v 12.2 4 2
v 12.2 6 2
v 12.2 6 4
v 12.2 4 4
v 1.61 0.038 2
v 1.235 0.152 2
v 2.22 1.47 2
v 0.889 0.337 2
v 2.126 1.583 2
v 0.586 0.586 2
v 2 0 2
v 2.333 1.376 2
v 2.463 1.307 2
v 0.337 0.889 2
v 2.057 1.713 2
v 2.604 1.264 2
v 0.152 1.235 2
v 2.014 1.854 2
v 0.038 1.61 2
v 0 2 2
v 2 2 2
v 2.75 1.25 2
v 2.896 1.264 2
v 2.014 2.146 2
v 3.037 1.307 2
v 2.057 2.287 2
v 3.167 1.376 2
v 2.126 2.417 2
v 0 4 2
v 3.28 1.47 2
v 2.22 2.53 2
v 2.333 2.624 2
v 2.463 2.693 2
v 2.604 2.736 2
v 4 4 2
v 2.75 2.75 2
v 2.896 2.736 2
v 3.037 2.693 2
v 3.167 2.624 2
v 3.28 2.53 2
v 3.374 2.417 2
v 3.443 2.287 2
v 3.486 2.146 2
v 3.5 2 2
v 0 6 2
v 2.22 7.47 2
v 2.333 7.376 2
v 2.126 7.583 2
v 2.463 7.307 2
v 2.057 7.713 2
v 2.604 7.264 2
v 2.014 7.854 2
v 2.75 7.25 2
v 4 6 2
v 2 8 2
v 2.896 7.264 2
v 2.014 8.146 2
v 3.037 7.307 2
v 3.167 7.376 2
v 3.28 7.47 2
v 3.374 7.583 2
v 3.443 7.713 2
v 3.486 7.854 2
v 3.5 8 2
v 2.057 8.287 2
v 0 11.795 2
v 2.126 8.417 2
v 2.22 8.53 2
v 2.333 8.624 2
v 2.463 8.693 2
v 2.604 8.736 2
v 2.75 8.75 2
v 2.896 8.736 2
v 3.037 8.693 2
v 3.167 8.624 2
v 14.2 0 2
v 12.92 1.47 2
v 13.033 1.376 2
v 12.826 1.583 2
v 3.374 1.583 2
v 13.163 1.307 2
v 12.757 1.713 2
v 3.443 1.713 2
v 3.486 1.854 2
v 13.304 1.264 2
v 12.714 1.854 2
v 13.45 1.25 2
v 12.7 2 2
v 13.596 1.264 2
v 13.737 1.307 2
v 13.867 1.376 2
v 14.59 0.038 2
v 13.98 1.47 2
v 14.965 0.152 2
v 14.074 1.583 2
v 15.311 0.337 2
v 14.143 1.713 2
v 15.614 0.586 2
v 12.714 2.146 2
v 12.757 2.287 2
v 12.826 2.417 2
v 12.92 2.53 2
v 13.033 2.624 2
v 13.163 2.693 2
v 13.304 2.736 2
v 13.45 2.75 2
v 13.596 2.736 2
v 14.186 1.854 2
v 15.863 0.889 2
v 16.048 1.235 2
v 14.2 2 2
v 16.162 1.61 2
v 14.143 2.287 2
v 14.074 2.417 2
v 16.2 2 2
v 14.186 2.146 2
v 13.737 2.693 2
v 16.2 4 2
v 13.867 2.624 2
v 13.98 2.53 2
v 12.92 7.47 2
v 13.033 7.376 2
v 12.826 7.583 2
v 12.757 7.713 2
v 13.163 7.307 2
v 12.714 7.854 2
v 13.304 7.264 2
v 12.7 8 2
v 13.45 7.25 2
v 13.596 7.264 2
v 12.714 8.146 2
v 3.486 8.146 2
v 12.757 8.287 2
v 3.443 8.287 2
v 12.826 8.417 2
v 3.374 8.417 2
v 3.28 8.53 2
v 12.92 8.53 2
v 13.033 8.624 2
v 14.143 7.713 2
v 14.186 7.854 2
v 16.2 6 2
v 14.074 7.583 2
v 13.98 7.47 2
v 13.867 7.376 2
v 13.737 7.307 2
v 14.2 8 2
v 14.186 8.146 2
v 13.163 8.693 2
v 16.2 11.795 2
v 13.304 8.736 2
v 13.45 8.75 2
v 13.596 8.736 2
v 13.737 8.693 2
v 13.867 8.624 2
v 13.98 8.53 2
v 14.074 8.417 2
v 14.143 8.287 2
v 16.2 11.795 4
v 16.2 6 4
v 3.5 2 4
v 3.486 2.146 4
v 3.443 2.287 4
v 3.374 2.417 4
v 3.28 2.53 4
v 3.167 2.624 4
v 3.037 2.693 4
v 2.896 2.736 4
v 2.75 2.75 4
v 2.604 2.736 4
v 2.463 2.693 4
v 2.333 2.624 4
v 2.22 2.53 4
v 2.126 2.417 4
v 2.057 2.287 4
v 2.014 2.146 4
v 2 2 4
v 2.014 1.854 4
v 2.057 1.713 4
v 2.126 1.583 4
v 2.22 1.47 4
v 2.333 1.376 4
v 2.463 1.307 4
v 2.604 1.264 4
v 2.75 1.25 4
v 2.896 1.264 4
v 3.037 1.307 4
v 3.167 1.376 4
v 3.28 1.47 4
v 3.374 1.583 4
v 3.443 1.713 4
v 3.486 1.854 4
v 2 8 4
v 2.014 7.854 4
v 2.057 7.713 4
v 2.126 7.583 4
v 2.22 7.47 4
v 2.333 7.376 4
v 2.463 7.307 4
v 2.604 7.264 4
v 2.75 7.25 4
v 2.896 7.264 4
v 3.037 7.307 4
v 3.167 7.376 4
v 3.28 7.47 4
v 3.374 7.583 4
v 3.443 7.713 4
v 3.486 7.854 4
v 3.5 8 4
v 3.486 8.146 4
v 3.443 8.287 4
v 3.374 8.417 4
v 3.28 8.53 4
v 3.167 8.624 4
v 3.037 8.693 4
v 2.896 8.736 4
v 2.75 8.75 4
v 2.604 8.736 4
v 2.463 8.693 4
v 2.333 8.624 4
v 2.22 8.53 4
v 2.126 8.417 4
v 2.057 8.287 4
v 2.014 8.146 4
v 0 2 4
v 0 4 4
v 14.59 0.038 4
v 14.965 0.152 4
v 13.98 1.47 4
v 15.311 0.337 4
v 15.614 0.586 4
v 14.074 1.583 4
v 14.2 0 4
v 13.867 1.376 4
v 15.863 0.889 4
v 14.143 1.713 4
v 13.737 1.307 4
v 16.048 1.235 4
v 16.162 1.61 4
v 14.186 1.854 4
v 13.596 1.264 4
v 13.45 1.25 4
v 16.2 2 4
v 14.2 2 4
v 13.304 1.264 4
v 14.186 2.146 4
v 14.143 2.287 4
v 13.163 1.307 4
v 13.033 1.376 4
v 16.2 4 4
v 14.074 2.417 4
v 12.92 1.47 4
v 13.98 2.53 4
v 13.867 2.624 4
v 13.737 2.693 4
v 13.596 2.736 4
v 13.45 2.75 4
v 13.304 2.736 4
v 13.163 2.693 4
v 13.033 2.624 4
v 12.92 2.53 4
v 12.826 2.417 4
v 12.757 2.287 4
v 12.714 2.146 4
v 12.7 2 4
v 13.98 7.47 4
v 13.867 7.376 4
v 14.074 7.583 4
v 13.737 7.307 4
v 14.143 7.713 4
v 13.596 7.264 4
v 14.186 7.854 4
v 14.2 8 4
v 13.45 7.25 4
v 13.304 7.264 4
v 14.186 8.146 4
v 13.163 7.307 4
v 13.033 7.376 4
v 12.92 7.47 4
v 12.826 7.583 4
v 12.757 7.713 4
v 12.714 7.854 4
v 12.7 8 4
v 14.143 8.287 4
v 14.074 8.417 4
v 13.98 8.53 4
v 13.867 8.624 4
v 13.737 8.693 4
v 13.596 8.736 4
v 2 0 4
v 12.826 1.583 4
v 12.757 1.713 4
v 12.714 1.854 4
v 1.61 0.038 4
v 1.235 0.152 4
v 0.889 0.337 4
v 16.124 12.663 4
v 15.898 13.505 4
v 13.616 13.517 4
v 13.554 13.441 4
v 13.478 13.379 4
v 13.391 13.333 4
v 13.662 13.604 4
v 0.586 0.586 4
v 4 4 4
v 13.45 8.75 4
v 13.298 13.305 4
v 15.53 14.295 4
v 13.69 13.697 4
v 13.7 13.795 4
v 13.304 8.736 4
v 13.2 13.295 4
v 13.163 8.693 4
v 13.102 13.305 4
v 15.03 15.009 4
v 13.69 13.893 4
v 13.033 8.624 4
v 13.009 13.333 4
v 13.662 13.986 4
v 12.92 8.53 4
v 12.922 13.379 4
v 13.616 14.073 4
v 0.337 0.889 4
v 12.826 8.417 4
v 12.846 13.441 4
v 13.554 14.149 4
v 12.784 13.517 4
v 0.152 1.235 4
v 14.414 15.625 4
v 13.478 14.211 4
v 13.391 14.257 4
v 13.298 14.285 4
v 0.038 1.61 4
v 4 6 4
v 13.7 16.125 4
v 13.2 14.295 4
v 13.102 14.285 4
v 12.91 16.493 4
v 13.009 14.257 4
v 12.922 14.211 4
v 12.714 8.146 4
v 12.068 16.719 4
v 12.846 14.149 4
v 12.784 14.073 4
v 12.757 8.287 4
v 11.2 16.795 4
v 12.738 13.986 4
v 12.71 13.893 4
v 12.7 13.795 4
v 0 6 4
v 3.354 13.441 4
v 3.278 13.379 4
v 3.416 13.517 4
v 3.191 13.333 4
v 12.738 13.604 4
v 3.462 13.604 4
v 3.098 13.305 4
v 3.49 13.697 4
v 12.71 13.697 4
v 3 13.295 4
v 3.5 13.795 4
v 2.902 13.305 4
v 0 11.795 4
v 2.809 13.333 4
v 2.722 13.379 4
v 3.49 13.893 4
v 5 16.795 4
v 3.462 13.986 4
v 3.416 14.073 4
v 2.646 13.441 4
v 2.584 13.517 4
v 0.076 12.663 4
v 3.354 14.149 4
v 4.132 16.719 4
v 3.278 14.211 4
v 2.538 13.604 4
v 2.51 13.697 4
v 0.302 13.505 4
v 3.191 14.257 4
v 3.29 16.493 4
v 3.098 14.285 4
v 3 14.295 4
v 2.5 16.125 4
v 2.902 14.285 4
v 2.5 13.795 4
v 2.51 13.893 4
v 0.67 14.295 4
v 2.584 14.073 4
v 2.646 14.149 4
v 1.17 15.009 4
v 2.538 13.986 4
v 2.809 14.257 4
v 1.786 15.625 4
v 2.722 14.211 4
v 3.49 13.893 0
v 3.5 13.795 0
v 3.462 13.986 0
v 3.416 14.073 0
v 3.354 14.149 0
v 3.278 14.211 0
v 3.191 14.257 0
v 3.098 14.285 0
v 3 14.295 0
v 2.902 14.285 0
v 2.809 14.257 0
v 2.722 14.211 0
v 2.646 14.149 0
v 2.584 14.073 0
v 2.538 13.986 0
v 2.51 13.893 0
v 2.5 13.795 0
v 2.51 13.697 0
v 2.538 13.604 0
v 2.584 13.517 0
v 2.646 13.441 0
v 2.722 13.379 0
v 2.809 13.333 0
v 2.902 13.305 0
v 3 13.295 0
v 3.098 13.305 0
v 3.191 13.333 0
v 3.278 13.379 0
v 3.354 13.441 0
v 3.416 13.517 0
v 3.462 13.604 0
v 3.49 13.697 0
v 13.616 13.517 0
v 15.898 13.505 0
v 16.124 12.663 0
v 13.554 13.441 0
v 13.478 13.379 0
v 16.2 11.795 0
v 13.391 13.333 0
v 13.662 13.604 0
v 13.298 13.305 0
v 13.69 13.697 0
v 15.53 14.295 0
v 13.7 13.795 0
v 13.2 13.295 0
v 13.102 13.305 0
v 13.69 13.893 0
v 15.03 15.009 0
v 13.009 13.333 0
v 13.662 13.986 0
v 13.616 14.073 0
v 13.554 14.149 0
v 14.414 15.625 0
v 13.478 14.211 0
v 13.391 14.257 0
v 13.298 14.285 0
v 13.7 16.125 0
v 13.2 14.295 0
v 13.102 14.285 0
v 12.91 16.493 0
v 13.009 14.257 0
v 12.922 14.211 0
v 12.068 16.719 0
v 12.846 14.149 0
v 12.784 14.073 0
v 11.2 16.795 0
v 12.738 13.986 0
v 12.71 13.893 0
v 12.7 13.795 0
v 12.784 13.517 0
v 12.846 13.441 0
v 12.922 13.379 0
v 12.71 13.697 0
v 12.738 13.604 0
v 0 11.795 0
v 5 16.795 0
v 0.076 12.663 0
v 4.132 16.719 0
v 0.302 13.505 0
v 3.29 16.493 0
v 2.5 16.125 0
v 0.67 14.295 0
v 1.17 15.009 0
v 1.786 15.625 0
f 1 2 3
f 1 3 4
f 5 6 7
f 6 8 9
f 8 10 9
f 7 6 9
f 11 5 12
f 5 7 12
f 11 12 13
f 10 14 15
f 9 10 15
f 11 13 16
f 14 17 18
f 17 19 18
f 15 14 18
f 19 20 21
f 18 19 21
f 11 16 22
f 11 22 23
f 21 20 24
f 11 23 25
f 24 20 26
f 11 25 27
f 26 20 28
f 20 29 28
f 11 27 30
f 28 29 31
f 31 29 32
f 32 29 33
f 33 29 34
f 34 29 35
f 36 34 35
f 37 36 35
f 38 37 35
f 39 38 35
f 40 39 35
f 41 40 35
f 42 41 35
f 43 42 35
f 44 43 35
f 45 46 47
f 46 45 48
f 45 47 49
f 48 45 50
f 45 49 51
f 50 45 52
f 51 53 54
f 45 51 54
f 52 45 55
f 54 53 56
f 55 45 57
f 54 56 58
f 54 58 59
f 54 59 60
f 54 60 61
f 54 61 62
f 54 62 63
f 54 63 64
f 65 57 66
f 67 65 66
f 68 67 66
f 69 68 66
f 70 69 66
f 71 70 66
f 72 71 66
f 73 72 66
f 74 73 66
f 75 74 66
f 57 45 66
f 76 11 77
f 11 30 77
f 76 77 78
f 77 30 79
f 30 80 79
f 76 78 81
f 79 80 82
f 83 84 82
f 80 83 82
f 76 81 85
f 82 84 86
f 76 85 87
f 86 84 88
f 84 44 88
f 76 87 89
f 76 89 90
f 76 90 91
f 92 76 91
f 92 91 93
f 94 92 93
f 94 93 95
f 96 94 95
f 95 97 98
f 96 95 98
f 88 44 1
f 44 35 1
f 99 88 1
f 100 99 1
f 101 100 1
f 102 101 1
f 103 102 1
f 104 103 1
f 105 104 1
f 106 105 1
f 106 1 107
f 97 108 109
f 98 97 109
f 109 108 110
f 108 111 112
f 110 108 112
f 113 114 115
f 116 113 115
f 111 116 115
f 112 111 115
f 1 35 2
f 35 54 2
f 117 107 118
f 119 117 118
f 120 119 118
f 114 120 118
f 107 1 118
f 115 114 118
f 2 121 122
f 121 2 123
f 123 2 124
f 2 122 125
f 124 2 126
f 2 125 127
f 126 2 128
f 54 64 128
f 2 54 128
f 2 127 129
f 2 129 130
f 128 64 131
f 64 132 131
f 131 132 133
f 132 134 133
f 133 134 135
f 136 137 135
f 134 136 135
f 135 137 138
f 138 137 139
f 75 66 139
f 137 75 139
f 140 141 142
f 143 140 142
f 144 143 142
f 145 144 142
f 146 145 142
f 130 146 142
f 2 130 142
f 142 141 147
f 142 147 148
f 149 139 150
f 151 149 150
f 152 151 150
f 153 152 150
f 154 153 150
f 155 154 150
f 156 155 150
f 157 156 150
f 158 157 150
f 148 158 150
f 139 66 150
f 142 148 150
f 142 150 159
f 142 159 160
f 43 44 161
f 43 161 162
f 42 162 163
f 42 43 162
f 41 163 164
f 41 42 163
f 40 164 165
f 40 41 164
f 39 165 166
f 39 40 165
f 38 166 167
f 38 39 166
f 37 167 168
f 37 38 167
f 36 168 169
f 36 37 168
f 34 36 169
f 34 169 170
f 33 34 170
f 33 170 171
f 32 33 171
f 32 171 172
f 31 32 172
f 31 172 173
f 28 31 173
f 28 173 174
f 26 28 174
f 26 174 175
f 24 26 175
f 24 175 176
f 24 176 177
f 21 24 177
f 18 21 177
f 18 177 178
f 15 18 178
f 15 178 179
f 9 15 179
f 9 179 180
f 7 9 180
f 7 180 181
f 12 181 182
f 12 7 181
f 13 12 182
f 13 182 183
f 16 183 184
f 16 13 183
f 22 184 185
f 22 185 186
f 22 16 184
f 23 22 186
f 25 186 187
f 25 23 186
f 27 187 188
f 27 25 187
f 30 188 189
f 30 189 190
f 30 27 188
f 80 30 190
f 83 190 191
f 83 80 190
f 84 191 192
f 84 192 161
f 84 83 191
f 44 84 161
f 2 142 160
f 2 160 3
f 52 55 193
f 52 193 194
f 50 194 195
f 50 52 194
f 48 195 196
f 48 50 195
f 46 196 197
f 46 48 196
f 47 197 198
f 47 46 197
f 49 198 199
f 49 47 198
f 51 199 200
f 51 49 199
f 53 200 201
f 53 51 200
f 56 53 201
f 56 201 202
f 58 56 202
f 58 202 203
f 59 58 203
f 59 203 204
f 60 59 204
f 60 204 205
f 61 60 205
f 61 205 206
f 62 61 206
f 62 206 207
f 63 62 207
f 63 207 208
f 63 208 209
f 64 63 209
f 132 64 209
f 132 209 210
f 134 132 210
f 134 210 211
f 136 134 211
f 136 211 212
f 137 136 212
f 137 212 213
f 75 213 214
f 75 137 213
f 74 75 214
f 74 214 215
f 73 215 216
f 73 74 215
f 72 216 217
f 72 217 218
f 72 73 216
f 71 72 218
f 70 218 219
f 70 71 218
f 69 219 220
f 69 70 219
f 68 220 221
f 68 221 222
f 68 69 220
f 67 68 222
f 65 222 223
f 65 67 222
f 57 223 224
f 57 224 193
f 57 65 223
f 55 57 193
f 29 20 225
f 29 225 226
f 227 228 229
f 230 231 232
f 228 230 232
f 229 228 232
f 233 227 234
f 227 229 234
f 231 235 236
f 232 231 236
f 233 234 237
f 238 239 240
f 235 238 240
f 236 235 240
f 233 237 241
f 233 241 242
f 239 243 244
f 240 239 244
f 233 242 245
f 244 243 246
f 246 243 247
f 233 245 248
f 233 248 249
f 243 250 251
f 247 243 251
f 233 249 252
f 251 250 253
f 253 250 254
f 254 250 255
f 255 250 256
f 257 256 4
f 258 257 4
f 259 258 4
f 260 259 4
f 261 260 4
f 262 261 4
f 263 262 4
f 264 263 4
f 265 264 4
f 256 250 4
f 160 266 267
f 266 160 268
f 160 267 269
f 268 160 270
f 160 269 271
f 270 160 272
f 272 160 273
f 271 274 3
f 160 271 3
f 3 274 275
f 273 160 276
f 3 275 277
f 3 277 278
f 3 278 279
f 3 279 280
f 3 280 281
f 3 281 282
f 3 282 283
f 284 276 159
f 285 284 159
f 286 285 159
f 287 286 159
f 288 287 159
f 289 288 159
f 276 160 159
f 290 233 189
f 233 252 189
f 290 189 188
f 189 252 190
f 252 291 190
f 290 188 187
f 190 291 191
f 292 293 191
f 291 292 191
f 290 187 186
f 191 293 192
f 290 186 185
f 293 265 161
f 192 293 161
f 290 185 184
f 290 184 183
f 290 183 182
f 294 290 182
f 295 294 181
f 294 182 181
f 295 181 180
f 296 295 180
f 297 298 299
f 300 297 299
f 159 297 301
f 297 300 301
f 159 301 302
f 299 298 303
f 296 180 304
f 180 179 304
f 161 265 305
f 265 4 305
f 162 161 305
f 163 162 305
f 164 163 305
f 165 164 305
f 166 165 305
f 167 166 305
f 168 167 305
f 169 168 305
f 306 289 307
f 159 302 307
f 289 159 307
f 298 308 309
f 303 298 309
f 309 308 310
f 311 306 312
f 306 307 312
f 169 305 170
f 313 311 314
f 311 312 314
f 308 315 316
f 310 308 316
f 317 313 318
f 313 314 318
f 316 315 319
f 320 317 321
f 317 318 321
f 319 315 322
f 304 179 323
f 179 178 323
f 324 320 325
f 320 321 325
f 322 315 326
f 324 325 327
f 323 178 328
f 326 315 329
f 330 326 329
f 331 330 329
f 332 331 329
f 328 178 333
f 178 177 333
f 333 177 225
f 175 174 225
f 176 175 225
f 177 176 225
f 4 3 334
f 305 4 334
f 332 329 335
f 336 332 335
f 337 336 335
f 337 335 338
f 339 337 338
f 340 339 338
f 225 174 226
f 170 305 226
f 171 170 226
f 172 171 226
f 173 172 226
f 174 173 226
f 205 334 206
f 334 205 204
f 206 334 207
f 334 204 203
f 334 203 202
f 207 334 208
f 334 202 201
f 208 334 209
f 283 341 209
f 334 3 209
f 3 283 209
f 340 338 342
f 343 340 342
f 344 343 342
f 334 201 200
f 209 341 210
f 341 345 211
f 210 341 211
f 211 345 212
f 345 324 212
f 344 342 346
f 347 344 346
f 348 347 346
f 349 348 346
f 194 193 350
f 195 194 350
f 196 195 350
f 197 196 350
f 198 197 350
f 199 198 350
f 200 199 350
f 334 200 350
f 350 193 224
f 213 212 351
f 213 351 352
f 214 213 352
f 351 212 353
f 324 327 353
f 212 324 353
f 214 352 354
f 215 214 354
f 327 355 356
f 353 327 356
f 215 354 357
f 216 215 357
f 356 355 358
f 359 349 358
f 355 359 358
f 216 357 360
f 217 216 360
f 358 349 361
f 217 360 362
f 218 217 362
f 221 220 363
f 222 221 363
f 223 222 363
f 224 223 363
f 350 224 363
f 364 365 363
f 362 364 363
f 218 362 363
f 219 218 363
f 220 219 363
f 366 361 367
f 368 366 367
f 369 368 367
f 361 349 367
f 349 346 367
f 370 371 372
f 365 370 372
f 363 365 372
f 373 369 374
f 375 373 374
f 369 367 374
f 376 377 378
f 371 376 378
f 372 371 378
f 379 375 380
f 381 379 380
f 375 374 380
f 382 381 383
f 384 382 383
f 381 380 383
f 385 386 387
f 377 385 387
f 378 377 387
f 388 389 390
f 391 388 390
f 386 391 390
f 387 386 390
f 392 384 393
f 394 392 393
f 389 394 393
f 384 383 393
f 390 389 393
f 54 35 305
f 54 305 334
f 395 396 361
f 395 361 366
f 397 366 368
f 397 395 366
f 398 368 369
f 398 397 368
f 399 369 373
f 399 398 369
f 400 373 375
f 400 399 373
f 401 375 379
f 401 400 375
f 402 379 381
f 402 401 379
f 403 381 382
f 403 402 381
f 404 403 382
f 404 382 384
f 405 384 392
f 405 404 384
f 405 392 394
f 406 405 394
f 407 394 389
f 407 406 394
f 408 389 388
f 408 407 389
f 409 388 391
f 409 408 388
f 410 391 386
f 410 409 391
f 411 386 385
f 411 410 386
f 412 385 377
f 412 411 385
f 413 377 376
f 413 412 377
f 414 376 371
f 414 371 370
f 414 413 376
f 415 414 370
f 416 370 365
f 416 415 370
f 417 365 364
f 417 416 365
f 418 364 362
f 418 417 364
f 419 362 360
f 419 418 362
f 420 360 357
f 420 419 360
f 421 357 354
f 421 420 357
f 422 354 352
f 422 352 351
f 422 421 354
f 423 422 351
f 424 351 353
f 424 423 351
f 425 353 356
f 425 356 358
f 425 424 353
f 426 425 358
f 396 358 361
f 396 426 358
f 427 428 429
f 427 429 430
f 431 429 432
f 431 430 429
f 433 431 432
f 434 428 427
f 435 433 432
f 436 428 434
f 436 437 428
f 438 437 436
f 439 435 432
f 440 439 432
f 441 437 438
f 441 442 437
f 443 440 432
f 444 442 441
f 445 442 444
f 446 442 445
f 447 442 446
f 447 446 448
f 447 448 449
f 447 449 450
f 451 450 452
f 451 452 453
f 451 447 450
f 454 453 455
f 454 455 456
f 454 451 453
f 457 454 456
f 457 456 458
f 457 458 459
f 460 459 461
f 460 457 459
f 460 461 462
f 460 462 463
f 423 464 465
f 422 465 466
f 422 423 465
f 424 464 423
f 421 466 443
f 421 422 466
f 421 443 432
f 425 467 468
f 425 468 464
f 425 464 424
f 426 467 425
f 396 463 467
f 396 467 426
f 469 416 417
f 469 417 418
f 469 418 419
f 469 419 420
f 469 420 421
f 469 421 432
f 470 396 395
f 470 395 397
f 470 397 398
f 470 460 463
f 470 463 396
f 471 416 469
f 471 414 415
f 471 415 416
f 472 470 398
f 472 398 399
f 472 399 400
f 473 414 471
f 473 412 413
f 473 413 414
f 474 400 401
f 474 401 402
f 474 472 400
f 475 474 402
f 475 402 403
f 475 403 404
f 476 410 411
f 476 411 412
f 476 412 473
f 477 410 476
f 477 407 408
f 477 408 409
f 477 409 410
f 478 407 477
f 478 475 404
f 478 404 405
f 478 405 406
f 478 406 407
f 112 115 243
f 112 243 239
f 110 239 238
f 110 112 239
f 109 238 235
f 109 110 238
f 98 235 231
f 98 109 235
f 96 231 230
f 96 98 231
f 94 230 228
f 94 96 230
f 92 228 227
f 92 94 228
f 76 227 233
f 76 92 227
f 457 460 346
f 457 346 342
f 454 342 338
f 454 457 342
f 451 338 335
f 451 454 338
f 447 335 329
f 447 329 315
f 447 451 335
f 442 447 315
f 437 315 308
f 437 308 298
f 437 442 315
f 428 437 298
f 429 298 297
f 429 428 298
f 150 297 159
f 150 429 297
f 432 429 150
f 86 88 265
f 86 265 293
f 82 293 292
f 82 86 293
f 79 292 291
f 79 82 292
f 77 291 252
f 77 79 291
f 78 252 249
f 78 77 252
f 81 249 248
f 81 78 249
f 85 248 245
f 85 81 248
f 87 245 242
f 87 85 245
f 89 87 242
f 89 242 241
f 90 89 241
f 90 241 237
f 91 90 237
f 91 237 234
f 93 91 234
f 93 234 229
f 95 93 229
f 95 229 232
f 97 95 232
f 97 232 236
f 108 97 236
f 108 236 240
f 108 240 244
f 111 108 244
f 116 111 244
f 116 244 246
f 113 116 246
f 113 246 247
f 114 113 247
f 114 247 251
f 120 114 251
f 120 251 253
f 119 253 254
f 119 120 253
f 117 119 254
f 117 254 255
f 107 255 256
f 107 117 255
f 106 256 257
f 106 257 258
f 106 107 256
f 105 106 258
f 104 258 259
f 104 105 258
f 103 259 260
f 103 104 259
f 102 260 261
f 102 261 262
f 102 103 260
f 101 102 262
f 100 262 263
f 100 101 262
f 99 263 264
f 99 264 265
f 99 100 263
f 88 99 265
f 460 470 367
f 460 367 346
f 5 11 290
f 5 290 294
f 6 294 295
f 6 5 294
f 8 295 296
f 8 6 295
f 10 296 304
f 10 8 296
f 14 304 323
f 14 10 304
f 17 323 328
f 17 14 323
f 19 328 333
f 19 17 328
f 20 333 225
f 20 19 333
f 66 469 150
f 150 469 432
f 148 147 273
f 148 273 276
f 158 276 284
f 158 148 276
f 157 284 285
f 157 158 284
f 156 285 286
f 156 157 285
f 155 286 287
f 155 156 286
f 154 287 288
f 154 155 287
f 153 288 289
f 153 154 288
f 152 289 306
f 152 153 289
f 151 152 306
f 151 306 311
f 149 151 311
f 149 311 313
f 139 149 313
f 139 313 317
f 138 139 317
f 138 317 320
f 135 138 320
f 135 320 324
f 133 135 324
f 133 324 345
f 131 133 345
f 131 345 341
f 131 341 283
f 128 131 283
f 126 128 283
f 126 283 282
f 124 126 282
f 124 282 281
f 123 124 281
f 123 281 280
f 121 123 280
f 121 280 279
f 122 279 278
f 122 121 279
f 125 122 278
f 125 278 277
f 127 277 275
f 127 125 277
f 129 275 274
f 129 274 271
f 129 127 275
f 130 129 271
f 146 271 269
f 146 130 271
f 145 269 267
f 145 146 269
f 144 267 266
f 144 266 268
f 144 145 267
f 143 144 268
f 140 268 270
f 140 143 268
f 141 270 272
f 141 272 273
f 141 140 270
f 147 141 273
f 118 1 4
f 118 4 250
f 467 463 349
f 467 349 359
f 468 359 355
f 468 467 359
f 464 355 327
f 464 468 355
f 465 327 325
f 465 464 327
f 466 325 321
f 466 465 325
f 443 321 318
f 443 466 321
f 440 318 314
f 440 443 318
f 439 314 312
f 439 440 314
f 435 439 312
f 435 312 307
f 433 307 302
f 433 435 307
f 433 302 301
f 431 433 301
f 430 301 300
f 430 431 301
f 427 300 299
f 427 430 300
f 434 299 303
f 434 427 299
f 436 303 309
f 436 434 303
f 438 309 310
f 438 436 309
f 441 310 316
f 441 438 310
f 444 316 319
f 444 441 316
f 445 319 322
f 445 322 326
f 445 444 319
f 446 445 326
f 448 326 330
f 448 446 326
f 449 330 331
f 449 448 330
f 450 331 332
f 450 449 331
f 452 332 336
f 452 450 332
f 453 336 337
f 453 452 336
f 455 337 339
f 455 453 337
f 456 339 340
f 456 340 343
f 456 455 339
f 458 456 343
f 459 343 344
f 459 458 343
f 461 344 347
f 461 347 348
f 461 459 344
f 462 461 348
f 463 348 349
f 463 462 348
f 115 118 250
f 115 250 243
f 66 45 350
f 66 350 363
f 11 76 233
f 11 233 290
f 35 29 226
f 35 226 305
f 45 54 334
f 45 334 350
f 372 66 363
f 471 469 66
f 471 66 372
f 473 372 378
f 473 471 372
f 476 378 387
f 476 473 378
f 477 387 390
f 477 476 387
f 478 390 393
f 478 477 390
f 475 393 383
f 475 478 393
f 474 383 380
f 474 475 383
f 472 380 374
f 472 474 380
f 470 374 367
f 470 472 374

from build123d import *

# Parameters (mm, degrees)
SKETCH1_R           = 0.75
SKETCH1_R_2         = 0.5
BOSS_EXTRUDE1_DEPTH = 4
SKETCH2_W           = 16.2
SKETCH2_H           = 11.795
CUT_EXTRUDE1_DEPTH  = 2


with BuildPart() as part:
    # Sketch1 → Boss-Extrude1 (new body)
    with BuildSketch(Plane.XY):
        with BuildLine():
            Line((0, 6), (0, 11.795))
            ThreePointArc((0, 11.795), (1.464466094, 15.330533906), (5, 16.795))
            Line((5, 16.795), (11.2, 16.795))
            ThreePointArc((11.2, 16.795), (14.735533906, 15.330533906), (16.2, 11.795))
            Line((16.2, 11.795), (16.2, 6))
            Line((16.2, 6), (12.2, 6))
            Line((12.2, 6), (12.2, 4))
            Line((12.2, 4), (16.2, 4))
            Line((16.2, 4), (16.2, 2))
            ThreePointArc((16.2, 2), (15.614213562, 0.585786438), (14.2, 0))
            Line((14.2, 0), (2, 0))
            ThreePointArc((2, 0), (0.585786438, 0.585786438), (0, 2))
            Line((0, 2), (0, 4))
            Line((0, 4), (4, 4))
            Line((4, 4), (4, 6))
            Line((4, 6), (0, 6))
        make_face()
        with Locations((13.45, 2)):
            Circle(SKETCH1_R, mode=Mode.SUBTRACT)
        with Locations((13.45, 8)):
            Circle(SKETCH1_R, mode=Mode.SUBTRACT)
        with Locations((3, 13.795)):
            Circle(SKETCH1_R_2, mode=Mode.SUBTRACT)
        with Locations((13.2, 13.795)):
            Circle(SKETCH1_R_2, mode=Mode.SUBTRACT)
        with Locations((2.75, 8)):
            Circle(SKETCH1_R, mode=Mode.SUBTRACT)
        with Locations((2.75, 2)):
            Circle(SKETCH1_R, mode=Mode.SUBTRACT)
    extrude(amount=BOSS_EXTRUDE1_DEPTH)

    # Sketch2 → Cut-Extrude1 (cut)
    with BuildSketch(Plane.XY):
        with Locations((8.1, 5.8975)):
            Rectangle(SKETCH2_W, SKETCH2_H)
    extrude(amount=CUT_EXTRUDE1_DEPTH, mode=Mode.SUBTRACT)


solid = part.part
